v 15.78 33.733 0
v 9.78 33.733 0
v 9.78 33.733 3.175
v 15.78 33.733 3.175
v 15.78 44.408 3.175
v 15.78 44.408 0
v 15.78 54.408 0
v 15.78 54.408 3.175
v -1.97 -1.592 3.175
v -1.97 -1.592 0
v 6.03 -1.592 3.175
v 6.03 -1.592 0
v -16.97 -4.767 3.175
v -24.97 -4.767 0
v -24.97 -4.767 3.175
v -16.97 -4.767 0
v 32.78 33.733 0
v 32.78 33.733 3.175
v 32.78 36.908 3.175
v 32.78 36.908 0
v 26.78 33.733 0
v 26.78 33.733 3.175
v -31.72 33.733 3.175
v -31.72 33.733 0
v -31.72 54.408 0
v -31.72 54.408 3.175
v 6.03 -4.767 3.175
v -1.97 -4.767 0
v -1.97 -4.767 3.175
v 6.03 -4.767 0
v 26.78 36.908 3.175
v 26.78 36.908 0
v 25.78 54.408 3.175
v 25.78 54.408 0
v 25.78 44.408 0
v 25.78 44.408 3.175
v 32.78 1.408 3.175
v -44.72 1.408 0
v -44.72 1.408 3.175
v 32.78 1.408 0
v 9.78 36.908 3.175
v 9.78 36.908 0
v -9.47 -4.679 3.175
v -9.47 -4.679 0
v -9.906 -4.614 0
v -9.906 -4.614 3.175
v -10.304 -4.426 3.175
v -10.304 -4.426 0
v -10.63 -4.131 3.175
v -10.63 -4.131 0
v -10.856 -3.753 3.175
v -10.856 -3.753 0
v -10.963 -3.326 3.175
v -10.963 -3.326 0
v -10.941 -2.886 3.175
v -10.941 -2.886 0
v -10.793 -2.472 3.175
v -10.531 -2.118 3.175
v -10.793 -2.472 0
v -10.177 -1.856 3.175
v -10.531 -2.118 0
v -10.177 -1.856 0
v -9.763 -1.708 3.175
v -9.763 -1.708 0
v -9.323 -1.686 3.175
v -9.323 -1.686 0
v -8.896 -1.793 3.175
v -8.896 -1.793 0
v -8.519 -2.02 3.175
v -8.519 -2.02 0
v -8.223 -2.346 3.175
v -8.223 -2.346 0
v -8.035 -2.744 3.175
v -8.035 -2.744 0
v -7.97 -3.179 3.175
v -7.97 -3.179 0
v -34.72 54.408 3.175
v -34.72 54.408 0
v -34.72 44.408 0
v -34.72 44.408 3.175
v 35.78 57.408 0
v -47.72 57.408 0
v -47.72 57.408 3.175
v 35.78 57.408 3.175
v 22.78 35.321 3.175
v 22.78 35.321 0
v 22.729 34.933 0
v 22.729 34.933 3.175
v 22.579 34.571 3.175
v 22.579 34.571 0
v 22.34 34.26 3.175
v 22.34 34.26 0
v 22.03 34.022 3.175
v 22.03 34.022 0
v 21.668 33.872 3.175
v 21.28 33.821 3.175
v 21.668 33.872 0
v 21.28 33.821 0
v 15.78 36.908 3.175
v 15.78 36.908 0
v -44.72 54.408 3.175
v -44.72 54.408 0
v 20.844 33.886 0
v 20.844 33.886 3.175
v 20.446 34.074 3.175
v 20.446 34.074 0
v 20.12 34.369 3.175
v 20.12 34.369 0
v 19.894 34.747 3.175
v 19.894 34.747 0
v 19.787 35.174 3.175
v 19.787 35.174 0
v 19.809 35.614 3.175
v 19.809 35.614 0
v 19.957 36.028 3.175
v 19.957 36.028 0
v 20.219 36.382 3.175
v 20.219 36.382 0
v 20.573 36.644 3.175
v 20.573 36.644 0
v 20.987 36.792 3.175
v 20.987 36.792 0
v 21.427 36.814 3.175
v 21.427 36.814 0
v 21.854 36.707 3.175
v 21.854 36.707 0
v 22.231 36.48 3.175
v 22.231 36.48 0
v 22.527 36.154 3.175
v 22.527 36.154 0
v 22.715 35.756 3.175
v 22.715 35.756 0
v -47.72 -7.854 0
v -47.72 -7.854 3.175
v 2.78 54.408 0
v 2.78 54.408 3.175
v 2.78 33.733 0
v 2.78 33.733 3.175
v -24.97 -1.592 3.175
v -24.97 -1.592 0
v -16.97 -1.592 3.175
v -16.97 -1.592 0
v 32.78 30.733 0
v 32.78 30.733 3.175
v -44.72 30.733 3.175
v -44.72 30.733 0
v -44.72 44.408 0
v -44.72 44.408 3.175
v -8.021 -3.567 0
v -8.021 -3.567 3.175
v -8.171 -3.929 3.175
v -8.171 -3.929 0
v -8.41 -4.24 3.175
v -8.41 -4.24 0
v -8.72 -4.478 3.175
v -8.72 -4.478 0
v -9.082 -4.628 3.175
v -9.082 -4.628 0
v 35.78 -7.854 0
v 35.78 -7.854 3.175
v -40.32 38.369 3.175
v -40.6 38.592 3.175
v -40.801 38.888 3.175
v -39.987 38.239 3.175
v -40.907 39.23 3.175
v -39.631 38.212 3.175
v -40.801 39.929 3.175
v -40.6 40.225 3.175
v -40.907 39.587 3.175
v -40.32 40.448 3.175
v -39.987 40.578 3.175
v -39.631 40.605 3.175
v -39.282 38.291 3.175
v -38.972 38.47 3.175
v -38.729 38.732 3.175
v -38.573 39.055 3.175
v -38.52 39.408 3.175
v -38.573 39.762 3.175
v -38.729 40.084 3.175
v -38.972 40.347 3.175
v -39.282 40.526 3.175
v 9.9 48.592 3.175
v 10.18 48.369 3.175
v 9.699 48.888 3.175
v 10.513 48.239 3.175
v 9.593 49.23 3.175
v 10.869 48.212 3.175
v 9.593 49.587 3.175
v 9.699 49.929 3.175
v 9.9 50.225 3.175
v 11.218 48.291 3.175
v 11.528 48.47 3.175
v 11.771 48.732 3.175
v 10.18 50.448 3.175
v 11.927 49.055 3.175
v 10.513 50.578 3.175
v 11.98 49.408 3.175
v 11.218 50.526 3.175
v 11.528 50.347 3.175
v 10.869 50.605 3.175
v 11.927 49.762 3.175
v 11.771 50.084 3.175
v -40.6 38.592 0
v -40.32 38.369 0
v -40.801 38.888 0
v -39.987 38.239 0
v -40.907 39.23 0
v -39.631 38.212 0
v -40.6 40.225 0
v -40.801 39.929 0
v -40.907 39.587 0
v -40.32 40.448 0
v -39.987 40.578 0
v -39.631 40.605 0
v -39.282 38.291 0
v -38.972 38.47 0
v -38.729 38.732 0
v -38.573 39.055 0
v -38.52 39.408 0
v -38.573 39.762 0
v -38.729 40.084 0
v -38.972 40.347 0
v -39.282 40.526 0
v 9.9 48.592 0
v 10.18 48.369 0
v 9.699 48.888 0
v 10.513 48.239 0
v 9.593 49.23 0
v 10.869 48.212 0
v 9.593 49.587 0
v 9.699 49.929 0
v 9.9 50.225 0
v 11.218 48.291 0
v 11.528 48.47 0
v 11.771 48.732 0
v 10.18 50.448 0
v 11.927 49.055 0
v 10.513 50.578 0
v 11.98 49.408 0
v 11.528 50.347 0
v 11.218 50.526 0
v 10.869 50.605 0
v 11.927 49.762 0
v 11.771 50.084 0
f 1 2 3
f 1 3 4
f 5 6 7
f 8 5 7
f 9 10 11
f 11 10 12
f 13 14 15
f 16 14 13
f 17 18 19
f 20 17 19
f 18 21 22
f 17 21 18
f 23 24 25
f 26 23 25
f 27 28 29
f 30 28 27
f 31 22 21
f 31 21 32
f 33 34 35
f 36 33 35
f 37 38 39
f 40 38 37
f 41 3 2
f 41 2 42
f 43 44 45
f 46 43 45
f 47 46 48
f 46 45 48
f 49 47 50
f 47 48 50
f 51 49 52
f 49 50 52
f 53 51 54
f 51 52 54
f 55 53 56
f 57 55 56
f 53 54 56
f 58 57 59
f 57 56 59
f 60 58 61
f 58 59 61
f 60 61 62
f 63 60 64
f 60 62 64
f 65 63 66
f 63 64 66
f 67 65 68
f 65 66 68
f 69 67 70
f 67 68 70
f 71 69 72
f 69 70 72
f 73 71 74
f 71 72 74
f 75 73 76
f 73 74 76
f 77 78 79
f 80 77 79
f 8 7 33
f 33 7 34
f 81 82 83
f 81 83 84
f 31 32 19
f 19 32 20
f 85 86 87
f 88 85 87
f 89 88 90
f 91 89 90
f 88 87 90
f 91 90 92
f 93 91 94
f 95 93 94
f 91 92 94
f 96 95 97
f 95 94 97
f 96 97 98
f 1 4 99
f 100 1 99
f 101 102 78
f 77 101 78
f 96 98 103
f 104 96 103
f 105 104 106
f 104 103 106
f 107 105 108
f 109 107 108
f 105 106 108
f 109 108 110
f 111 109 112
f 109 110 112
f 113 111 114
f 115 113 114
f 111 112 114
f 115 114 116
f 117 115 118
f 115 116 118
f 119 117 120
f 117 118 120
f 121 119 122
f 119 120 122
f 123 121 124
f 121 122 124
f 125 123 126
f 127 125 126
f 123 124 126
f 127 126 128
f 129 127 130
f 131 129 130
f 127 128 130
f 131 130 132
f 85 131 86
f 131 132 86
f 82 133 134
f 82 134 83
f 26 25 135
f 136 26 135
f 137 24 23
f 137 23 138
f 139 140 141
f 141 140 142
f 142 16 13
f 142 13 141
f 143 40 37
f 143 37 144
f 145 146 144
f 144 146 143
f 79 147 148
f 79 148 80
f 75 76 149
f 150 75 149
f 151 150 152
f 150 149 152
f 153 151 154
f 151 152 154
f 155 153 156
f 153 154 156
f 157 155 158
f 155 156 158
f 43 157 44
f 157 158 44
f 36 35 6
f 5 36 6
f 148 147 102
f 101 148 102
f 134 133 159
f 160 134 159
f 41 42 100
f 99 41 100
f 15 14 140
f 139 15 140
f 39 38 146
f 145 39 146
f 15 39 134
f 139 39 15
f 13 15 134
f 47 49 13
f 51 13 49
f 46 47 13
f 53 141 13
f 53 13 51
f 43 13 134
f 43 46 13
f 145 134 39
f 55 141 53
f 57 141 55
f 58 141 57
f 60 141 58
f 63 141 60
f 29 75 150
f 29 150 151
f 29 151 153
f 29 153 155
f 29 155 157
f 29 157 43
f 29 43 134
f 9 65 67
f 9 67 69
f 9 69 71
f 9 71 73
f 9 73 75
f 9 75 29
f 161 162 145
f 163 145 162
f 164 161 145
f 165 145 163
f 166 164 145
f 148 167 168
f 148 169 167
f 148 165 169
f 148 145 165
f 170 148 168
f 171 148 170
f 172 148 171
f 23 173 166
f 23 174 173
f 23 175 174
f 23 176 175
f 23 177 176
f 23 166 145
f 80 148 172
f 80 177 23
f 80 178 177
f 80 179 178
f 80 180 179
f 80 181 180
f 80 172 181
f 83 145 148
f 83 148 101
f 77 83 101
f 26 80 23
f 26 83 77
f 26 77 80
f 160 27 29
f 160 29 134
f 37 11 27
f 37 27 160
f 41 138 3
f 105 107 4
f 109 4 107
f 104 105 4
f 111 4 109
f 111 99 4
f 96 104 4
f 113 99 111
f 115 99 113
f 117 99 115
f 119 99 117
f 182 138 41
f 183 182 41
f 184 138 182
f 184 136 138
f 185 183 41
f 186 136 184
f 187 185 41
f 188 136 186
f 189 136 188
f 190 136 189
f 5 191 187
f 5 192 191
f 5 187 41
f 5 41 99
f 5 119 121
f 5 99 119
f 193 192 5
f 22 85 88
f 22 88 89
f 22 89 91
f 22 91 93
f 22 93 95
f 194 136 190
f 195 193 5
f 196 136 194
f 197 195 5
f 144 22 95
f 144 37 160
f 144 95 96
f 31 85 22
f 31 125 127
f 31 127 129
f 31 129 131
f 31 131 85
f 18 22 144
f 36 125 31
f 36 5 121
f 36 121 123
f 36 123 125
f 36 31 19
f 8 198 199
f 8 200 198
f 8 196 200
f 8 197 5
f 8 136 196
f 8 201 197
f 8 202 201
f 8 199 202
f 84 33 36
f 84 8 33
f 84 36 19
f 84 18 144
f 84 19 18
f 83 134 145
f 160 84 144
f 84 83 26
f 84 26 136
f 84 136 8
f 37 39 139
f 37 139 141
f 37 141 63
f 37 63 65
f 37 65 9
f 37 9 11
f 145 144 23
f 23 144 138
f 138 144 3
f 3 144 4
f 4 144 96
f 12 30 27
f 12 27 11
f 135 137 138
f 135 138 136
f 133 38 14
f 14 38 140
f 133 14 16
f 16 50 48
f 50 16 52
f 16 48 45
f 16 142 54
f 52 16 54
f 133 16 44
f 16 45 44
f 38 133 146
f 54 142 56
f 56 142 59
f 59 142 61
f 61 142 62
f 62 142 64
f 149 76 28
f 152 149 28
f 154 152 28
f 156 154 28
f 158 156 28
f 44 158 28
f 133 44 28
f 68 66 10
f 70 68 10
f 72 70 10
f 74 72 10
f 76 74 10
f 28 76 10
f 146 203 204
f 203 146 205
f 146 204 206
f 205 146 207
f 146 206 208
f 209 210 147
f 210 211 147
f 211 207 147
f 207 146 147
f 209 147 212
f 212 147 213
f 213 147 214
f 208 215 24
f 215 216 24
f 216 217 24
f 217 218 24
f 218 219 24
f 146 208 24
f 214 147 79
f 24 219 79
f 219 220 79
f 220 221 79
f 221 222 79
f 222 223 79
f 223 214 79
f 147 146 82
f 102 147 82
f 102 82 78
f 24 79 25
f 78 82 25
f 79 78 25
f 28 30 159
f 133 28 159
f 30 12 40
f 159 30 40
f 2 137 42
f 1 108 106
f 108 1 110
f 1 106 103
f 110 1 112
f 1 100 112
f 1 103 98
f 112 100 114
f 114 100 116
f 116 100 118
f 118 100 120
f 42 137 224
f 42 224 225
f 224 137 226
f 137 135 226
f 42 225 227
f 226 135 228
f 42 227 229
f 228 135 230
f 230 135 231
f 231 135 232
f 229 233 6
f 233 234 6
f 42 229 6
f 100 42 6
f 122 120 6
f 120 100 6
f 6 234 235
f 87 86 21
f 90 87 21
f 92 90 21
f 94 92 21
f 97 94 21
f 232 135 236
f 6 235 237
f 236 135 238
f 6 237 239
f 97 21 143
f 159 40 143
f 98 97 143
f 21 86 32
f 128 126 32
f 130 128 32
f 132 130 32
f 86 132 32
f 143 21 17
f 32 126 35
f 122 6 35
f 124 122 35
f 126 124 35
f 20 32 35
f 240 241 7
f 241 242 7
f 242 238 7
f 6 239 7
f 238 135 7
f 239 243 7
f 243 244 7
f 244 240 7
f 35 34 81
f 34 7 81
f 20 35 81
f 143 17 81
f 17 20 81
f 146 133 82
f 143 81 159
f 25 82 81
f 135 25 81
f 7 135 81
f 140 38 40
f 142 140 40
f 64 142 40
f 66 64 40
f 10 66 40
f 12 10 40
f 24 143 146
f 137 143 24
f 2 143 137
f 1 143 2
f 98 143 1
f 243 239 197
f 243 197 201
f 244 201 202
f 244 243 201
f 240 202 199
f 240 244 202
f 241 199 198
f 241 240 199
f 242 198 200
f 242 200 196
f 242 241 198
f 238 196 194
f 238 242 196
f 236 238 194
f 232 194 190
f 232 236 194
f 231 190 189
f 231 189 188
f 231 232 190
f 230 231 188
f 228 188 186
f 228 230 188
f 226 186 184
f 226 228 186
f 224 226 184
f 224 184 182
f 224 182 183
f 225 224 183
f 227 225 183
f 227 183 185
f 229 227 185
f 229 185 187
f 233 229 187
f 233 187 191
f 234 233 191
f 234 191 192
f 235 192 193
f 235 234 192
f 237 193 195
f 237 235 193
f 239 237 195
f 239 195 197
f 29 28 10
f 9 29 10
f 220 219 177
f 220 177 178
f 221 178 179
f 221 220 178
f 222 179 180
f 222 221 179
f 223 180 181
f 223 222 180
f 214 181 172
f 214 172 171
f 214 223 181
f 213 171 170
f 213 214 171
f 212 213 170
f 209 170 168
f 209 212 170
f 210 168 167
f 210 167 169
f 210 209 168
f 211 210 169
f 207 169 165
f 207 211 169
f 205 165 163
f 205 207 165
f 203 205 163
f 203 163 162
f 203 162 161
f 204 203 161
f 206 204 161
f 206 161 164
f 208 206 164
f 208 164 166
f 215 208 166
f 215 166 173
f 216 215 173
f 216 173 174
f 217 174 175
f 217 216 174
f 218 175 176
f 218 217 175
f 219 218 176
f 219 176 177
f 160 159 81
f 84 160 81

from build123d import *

# Parameters (mm, degrees)
F0_W     = 83.5
F0_H     = 65.2625
F0_W_2   = 8
F0_H_2   = 3.175
F0_W_3   = 77.5
F0_H_3   = 29.325
F0_W_4   = 34.5
F0_H_4   = 20.675
F0_W_5   = 6
F0_W_6   = 10
F0_H_5   = 10
F0_R     = 1.2
F1_DEPTH = 3.175


# Not quite as in the source:
# - a length typed as a fraction of an inch, garbled in the dataset ("3 / 203.2 mm" for 3/8 in), is restored
# - a feature names something its author has since deleted; it is built from what else it names


with BuildPart() as f1:
    # F0 (on Top) → F1 (new body)
    with BuildSketch(Plane.XY):
        with Locations((-5.970182175, 24.7772044539)):
            Rectangle(F0_W, F0_H)
        with Locations((-20.970182175, -3.1790455461)):
            Rectangle(F0_W_2, F0_H_2, mode=Mode.SUBTRACT)
        with BuildLine():
            ThreePointArc((-9.470182175, -4.6790455461), (-10.5308423468, -2.1183853743), (-7.970182175, -3.1790455461))
            ThreePointArc((-7.970182175, -3.1790455461), (-8.4095220032, -4.2397057179), (-9.470182175, -4.6790455461))
        make_face(mode=Mode.SUBTRACT)
        with Locations((2.029817825, -3.1790455461)):
            Rectangle(F0_W_2, F0_H_2, mode=Mode.SUBTRACT)
        with Locations((-5.970182175, 16.0709544539)):
            Rectangle(F0_W_3, F0_H_3, mode=Mode.SUBTRACT)
        Polygon((-44.720182175, 34.4084544539), (-44.720182175, 44.4084544539), (-44.720182175, 54.4084544539), (-34.720182175, 54.4084544539), (-34.720182175, 44.4084544539), (-34.720182175, 34.4084544539), align=None, mode=Mode.SUBTRACT)
        with Locations((-14.470182175, 44.0709544539)):
            Rectangle(F0_W_4, F0_H_4, mode=Mode.SUBTRACT)
        with Locations((12.779817825, 35.3209544539)):
            Rectangle(F0_W_5, F0_H_2, mode=Mode.SUBTRACT)
        with BuildLine():
            ThreePointArc((21.279817825, 33.8209544539), (20.2191576532, 36.3816146257), (22.779817825, 35.3209544539))
            ThreePointArc((22.779817825, 35.3209544539), (22.3404779968, 34.2602942821), (21.279817825, 33.8209544539))
        make_face(mode=Mode.SUBTRACT)
        with Locations((29.779817825, 35.3209544539)):
            Rectangle(F0_W_5, F0_H_2, mode=Mode.SUBTRACT)
        Polygon((25.779817825, 44.4084544539), (15.779817825, 44.4084544539), (5.779817825, 44.4084544539), (5.779817825, 54.4084544539), (15.779817825, 54.4084544539), (25.779817825, 54.4084544539), align=None, mode=Mode.SUBTRACT)
        with Locations((-39.720182175, 39.4084544539)):
            Rectangle(F0_W_6, F0_H_5)
        with Locations((-39.720182175, 39.4084544539)):
            Circle(F0_R, mode=Mode.SUBTRACT)
        with Locations((10.779817825, 49.4084544539)):
            Rectangle(F0_W_6, F0_H_5)
        with Locations((10.779817825, 49.4084544539)):
            Circle(F0_R, mode=Mode.SUBTRACT)
    extrude(amount=F1_DEPTH)


solid = f1.part
